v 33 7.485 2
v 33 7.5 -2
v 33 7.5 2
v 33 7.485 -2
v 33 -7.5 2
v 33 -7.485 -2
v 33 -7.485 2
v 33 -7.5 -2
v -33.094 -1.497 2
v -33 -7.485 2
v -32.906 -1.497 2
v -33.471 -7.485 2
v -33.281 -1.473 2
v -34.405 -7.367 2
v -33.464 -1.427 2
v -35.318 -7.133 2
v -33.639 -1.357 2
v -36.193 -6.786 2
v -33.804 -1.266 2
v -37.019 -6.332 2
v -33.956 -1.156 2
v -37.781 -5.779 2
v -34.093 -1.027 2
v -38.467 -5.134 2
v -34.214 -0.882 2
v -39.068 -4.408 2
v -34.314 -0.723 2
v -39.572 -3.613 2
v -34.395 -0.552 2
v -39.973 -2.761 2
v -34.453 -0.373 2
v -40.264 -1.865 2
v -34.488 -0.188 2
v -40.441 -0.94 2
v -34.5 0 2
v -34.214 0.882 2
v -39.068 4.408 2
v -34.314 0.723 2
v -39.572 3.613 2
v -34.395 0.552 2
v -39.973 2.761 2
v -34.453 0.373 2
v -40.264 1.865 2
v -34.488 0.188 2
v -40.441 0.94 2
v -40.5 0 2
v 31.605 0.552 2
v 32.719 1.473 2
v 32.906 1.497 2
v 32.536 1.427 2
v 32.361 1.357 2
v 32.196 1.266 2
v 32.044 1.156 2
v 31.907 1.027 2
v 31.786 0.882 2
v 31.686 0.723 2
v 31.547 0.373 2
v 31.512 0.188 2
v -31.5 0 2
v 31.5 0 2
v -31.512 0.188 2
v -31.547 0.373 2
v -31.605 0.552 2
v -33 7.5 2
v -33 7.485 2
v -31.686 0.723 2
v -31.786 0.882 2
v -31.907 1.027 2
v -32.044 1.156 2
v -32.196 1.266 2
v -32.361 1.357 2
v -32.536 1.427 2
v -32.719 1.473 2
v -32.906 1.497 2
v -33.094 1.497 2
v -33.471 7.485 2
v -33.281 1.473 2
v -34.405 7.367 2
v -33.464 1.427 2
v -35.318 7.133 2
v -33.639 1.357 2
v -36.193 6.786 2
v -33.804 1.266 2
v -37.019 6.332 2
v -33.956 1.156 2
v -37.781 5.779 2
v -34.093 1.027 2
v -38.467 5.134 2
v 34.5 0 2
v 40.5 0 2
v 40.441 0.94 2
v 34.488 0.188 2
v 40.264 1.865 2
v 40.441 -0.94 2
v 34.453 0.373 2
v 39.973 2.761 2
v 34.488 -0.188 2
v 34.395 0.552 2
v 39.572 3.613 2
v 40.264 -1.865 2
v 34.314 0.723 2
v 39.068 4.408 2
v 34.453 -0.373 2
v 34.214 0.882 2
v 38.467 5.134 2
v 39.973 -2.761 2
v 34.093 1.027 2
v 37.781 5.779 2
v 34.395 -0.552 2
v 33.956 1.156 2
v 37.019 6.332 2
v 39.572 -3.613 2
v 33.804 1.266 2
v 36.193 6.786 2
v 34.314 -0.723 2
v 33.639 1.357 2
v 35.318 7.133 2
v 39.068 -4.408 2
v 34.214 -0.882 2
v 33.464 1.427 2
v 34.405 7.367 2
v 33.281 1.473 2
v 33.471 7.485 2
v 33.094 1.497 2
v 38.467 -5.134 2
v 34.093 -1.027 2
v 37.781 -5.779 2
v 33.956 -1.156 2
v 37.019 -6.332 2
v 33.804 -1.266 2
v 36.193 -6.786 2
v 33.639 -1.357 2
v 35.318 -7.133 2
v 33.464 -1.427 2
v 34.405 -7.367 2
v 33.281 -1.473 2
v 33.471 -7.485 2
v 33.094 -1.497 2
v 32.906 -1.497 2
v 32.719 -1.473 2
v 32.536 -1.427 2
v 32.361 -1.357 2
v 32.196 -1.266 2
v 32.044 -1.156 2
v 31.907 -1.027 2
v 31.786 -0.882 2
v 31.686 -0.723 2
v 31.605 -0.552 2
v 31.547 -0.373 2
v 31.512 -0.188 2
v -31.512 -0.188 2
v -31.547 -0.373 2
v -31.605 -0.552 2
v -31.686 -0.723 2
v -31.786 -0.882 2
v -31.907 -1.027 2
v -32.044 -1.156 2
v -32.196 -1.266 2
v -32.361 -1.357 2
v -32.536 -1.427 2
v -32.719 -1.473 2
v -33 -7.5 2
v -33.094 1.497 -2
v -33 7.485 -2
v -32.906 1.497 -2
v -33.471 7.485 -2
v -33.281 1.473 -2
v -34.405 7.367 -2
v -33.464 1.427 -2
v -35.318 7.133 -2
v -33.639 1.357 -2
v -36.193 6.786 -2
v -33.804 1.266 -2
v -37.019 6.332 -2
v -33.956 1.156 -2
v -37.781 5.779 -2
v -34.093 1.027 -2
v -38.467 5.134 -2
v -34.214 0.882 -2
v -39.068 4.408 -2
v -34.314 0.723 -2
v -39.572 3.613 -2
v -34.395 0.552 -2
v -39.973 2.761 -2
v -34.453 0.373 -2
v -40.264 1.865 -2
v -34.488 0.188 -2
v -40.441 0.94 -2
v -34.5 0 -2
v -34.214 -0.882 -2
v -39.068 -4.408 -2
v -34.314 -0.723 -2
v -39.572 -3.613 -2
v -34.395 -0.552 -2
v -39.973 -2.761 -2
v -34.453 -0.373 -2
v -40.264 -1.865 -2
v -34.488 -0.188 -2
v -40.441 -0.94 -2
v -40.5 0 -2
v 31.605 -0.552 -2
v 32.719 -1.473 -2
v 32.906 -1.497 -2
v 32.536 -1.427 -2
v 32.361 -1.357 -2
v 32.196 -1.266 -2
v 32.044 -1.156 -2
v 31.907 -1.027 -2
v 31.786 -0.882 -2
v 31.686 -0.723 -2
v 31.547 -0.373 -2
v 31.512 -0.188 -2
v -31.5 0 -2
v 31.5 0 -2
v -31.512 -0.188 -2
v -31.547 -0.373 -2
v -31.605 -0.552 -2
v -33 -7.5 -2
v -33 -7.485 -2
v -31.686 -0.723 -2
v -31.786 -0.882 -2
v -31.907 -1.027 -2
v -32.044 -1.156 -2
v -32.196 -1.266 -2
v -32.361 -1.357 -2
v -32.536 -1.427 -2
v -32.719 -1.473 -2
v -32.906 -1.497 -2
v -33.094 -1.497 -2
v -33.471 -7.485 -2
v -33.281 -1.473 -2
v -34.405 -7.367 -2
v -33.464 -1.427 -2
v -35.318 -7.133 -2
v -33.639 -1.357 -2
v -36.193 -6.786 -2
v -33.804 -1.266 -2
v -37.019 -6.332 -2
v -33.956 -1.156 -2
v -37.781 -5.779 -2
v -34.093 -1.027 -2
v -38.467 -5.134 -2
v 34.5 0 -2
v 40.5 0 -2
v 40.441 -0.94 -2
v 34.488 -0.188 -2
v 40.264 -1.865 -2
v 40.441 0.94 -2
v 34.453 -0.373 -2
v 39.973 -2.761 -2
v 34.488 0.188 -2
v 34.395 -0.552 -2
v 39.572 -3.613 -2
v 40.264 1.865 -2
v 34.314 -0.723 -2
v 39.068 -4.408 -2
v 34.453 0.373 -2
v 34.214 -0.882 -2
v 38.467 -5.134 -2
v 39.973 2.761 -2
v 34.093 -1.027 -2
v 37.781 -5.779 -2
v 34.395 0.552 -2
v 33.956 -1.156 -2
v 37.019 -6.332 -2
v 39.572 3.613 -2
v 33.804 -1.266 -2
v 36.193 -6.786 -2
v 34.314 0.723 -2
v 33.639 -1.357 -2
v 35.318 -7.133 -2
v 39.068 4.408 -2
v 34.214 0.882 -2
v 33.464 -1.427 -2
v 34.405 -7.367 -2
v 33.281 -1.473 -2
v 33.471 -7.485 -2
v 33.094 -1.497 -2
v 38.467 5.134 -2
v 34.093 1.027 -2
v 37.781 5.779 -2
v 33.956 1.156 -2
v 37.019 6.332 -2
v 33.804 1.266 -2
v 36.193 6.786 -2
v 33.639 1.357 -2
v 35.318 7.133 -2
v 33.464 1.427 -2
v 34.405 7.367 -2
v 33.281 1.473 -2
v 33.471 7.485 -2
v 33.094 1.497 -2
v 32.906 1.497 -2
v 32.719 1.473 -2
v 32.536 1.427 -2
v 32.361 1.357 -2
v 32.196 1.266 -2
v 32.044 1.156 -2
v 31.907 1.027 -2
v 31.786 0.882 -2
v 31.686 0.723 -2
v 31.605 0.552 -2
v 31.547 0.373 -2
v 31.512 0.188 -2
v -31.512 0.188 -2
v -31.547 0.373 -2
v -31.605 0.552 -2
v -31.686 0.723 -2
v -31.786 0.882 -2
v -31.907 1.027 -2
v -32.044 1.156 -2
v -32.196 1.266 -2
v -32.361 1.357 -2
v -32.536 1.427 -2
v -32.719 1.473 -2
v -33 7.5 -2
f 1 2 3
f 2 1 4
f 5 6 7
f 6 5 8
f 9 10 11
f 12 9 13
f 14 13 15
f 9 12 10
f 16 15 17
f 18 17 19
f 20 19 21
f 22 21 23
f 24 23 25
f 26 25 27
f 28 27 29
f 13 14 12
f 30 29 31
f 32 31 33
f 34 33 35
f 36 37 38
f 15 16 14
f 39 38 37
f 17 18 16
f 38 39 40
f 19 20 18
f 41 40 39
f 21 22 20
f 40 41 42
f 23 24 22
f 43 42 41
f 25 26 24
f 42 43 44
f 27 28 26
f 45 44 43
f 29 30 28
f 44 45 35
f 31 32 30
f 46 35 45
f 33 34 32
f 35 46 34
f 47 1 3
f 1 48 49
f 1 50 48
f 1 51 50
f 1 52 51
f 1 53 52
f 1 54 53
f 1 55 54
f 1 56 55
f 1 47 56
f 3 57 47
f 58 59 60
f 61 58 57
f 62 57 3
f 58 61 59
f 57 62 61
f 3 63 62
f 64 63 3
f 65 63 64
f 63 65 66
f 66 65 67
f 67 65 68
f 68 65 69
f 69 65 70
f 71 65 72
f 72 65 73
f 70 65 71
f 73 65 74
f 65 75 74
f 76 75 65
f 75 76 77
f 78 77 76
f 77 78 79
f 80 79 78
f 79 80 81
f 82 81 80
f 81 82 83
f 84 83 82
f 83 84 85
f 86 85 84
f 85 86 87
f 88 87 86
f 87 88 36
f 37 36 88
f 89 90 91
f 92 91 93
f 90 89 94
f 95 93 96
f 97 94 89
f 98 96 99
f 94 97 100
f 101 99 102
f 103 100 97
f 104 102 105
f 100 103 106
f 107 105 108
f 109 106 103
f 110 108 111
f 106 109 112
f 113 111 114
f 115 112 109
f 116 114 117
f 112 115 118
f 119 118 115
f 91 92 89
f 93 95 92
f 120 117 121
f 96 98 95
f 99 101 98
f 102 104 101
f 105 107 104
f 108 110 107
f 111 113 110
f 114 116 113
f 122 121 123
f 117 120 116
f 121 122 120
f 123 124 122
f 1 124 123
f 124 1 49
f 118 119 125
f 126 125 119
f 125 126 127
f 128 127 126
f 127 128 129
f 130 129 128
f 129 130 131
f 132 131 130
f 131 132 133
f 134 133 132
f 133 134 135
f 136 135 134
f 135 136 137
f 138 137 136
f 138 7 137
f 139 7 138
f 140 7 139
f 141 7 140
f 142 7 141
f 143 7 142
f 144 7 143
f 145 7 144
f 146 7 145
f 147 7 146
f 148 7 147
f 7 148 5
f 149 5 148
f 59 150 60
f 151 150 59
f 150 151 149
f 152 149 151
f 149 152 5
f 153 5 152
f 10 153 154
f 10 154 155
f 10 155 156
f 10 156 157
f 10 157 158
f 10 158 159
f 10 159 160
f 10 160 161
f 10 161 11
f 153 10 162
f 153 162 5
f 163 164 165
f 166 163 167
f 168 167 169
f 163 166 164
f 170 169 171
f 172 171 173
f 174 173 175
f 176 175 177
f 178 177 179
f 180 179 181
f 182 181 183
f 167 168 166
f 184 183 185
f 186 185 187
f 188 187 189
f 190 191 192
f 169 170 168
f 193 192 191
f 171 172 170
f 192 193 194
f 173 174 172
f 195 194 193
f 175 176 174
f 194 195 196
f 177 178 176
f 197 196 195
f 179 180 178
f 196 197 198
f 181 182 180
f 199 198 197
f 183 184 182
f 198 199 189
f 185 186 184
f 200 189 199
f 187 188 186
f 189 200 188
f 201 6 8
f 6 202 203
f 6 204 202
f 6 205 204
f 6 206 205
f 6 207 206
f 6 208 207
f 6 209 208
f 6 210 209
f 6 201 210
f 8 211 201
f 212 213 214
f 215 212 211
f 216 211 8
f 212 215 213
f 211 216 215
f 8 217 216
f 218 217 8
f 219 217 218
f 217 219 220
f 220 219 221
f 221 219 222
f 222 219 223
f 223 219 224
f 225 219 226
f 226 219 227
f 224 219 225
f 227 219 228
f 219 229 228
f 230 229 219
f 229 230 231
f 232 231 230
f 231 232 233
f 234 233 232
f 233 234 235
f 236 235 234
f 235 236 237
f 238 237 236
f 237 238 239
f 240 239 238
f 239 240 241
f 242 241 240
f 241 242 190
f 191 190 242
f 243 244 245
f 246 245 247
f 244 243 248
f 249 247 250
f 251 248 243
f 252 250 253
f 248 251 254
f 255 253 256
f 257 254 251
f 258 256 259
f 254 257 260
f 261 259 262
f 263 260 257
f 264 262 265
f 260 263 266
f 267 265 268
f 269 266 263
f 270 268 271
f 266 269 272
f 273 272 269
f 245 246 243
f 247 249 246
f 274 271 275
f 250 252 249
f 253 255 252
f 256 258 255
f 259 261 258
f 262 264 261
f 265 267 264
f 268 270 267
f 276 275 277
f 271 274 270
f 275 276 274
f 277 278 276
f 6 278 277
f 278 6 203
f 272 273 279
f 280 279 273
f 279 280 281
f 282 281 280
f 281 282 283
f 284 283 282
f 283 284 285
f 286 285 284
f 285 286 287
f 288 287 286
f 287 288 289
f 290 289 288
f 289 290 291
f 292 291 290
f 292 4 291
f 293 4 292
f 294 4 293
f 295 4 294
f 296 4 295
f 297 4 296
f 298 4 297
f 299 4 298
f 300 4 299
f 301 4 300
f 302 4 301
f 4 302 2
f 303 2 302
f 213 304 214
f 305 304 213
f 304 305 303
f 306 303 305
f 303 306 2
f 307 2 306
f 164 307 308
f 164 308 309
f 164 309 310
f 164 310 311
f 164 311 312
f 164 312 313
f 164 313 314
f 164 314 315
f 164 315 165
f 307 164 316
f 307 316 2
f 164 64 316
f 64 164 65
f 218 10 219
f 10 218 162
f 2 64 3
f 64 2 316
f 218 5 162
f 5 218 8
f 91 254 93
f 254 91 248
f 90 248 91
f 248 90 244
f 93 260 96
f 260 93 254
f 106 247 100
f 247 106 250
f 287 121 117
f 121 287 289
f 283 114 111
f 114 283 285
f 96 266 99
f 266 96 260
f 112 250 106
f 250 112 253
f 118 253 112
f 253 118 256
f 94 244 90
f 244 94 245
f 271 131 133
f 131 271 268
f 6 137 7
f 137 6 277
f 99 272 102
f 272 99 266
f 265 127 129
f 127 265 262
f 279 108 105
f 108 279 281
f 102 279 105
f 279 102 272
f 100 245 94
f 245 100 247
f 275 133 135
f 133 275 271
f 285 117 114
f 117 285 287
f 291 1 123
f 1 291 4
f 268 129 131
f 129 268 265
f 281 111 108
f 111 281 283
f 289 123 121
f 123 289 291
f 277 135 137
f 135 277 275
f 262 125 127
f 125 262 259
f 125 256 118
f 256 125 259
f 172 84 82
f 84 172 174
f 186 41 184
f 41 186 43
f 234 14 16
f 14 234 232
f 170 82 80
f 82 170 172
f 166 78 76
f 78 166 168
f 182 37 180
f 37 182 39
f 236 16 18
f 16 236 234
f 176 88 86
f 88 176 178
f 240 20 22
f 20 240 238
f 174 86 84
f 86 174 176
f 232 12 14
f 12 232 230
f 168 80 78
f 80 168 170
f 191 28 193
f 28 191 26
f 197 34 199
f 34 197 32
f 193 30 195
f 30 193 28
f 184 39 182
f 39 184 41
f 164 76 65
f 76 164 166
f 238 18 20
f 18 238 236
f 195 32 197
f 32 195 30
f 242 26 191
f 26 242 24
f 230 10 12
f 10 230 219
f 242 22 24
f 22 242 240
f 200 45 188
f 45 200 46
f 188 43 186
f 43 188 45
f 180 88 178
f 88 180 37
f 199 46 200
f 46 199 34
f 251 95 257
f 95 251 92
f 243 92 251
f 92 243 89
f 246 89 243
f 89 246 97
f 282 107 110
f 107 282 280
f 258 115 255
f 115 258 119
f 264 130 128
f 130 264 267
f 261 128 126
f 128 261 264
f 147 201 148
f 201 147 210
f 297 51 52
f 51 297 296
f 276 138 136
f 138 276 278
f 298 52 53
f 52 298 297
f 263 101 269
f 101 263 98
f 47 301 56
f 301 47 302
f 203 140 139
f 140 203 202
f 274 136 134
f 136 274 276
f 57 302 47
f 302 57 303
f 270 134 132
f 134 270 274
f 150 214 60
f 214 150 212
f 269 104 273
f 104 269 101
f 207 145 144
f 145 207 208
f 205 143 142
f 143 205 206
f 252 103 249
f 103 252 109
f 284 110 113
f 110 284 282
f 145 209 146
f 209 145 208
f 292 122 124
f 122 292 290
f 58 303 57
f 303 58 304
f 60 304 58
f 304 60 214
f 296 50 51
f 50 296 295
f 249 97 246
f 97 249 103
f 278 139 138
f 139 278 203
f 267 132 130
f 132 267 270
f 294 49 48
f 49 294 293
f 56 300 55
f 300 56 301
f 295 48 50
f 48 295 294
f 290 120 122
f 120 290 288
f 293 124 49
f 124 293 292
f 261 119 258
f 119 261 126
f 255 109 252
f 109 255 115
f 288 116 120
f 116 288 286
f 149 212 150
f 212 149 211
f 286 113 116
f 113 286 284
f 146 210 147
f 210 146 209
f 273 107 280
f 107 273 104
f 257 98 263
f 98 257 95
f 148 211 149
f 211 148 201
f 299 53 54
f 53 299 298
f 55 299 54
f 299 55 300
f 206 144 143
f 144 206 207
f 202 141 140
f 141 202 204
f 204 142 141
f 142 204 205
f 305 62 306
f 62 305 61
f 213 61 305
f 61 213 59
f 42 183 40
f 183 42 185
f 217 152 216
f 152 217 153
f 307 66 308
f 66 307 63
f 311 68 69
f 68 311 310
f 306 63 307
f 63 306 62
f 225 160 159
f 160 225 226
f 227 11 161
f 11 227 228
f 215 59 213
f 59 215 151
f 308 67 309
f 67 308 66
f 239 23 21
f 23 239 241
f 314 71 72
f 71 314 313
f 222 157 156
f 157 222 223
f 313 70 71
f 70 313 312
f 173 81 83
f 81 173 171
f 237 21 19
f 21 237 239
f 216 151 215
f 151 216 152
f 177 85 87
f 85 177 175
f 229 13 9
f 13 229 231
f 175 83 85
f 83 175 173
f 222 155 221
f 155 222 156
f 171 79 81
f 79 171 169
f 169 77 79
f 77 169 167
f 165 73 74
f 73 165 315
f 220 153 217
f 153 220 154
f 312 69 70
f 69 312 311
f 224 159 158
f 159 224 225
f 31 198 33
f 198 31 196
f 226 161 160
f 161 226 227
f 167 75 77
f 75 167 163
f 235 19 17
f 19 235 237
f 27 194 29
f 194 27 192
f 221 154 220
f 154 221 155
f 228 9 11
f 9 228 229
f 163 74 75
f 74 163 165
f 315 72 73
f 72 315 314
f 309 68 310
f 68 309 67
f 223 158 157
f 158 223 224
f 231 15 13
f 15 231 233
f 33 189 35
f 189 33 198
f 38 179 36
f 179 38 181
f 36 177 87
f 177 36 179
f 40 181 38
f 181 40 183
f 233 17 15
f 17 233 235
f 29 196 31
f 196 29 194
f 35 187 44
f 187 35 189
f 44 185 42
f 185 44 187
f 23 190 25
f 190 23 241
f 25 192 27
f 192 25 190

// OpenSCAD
//Author: Piotr Paterek, Kraków 05-08.2016
$fn=50;
module cal()
{
cube([66,15,4], center=true);
        translate([33,0,0])
                        {
                            cylinder(r=7.5, h=4, center=true);
                        }
    
    translate([-33,0,0])
                        {
                            cylinder(r=7.5,, h=4, center=true);
                        }
                    }

difference()
{
    difference()
    {
        cal();
        translate([33,0,0])
                        {
                            cylinder(r=1.5, h=4, center=true);
                        }
    }
    translate([-33,0,0])
                        {
                            cylinder(r=1.5, h=4, center=true);
                        }
                    }
                     
                    
